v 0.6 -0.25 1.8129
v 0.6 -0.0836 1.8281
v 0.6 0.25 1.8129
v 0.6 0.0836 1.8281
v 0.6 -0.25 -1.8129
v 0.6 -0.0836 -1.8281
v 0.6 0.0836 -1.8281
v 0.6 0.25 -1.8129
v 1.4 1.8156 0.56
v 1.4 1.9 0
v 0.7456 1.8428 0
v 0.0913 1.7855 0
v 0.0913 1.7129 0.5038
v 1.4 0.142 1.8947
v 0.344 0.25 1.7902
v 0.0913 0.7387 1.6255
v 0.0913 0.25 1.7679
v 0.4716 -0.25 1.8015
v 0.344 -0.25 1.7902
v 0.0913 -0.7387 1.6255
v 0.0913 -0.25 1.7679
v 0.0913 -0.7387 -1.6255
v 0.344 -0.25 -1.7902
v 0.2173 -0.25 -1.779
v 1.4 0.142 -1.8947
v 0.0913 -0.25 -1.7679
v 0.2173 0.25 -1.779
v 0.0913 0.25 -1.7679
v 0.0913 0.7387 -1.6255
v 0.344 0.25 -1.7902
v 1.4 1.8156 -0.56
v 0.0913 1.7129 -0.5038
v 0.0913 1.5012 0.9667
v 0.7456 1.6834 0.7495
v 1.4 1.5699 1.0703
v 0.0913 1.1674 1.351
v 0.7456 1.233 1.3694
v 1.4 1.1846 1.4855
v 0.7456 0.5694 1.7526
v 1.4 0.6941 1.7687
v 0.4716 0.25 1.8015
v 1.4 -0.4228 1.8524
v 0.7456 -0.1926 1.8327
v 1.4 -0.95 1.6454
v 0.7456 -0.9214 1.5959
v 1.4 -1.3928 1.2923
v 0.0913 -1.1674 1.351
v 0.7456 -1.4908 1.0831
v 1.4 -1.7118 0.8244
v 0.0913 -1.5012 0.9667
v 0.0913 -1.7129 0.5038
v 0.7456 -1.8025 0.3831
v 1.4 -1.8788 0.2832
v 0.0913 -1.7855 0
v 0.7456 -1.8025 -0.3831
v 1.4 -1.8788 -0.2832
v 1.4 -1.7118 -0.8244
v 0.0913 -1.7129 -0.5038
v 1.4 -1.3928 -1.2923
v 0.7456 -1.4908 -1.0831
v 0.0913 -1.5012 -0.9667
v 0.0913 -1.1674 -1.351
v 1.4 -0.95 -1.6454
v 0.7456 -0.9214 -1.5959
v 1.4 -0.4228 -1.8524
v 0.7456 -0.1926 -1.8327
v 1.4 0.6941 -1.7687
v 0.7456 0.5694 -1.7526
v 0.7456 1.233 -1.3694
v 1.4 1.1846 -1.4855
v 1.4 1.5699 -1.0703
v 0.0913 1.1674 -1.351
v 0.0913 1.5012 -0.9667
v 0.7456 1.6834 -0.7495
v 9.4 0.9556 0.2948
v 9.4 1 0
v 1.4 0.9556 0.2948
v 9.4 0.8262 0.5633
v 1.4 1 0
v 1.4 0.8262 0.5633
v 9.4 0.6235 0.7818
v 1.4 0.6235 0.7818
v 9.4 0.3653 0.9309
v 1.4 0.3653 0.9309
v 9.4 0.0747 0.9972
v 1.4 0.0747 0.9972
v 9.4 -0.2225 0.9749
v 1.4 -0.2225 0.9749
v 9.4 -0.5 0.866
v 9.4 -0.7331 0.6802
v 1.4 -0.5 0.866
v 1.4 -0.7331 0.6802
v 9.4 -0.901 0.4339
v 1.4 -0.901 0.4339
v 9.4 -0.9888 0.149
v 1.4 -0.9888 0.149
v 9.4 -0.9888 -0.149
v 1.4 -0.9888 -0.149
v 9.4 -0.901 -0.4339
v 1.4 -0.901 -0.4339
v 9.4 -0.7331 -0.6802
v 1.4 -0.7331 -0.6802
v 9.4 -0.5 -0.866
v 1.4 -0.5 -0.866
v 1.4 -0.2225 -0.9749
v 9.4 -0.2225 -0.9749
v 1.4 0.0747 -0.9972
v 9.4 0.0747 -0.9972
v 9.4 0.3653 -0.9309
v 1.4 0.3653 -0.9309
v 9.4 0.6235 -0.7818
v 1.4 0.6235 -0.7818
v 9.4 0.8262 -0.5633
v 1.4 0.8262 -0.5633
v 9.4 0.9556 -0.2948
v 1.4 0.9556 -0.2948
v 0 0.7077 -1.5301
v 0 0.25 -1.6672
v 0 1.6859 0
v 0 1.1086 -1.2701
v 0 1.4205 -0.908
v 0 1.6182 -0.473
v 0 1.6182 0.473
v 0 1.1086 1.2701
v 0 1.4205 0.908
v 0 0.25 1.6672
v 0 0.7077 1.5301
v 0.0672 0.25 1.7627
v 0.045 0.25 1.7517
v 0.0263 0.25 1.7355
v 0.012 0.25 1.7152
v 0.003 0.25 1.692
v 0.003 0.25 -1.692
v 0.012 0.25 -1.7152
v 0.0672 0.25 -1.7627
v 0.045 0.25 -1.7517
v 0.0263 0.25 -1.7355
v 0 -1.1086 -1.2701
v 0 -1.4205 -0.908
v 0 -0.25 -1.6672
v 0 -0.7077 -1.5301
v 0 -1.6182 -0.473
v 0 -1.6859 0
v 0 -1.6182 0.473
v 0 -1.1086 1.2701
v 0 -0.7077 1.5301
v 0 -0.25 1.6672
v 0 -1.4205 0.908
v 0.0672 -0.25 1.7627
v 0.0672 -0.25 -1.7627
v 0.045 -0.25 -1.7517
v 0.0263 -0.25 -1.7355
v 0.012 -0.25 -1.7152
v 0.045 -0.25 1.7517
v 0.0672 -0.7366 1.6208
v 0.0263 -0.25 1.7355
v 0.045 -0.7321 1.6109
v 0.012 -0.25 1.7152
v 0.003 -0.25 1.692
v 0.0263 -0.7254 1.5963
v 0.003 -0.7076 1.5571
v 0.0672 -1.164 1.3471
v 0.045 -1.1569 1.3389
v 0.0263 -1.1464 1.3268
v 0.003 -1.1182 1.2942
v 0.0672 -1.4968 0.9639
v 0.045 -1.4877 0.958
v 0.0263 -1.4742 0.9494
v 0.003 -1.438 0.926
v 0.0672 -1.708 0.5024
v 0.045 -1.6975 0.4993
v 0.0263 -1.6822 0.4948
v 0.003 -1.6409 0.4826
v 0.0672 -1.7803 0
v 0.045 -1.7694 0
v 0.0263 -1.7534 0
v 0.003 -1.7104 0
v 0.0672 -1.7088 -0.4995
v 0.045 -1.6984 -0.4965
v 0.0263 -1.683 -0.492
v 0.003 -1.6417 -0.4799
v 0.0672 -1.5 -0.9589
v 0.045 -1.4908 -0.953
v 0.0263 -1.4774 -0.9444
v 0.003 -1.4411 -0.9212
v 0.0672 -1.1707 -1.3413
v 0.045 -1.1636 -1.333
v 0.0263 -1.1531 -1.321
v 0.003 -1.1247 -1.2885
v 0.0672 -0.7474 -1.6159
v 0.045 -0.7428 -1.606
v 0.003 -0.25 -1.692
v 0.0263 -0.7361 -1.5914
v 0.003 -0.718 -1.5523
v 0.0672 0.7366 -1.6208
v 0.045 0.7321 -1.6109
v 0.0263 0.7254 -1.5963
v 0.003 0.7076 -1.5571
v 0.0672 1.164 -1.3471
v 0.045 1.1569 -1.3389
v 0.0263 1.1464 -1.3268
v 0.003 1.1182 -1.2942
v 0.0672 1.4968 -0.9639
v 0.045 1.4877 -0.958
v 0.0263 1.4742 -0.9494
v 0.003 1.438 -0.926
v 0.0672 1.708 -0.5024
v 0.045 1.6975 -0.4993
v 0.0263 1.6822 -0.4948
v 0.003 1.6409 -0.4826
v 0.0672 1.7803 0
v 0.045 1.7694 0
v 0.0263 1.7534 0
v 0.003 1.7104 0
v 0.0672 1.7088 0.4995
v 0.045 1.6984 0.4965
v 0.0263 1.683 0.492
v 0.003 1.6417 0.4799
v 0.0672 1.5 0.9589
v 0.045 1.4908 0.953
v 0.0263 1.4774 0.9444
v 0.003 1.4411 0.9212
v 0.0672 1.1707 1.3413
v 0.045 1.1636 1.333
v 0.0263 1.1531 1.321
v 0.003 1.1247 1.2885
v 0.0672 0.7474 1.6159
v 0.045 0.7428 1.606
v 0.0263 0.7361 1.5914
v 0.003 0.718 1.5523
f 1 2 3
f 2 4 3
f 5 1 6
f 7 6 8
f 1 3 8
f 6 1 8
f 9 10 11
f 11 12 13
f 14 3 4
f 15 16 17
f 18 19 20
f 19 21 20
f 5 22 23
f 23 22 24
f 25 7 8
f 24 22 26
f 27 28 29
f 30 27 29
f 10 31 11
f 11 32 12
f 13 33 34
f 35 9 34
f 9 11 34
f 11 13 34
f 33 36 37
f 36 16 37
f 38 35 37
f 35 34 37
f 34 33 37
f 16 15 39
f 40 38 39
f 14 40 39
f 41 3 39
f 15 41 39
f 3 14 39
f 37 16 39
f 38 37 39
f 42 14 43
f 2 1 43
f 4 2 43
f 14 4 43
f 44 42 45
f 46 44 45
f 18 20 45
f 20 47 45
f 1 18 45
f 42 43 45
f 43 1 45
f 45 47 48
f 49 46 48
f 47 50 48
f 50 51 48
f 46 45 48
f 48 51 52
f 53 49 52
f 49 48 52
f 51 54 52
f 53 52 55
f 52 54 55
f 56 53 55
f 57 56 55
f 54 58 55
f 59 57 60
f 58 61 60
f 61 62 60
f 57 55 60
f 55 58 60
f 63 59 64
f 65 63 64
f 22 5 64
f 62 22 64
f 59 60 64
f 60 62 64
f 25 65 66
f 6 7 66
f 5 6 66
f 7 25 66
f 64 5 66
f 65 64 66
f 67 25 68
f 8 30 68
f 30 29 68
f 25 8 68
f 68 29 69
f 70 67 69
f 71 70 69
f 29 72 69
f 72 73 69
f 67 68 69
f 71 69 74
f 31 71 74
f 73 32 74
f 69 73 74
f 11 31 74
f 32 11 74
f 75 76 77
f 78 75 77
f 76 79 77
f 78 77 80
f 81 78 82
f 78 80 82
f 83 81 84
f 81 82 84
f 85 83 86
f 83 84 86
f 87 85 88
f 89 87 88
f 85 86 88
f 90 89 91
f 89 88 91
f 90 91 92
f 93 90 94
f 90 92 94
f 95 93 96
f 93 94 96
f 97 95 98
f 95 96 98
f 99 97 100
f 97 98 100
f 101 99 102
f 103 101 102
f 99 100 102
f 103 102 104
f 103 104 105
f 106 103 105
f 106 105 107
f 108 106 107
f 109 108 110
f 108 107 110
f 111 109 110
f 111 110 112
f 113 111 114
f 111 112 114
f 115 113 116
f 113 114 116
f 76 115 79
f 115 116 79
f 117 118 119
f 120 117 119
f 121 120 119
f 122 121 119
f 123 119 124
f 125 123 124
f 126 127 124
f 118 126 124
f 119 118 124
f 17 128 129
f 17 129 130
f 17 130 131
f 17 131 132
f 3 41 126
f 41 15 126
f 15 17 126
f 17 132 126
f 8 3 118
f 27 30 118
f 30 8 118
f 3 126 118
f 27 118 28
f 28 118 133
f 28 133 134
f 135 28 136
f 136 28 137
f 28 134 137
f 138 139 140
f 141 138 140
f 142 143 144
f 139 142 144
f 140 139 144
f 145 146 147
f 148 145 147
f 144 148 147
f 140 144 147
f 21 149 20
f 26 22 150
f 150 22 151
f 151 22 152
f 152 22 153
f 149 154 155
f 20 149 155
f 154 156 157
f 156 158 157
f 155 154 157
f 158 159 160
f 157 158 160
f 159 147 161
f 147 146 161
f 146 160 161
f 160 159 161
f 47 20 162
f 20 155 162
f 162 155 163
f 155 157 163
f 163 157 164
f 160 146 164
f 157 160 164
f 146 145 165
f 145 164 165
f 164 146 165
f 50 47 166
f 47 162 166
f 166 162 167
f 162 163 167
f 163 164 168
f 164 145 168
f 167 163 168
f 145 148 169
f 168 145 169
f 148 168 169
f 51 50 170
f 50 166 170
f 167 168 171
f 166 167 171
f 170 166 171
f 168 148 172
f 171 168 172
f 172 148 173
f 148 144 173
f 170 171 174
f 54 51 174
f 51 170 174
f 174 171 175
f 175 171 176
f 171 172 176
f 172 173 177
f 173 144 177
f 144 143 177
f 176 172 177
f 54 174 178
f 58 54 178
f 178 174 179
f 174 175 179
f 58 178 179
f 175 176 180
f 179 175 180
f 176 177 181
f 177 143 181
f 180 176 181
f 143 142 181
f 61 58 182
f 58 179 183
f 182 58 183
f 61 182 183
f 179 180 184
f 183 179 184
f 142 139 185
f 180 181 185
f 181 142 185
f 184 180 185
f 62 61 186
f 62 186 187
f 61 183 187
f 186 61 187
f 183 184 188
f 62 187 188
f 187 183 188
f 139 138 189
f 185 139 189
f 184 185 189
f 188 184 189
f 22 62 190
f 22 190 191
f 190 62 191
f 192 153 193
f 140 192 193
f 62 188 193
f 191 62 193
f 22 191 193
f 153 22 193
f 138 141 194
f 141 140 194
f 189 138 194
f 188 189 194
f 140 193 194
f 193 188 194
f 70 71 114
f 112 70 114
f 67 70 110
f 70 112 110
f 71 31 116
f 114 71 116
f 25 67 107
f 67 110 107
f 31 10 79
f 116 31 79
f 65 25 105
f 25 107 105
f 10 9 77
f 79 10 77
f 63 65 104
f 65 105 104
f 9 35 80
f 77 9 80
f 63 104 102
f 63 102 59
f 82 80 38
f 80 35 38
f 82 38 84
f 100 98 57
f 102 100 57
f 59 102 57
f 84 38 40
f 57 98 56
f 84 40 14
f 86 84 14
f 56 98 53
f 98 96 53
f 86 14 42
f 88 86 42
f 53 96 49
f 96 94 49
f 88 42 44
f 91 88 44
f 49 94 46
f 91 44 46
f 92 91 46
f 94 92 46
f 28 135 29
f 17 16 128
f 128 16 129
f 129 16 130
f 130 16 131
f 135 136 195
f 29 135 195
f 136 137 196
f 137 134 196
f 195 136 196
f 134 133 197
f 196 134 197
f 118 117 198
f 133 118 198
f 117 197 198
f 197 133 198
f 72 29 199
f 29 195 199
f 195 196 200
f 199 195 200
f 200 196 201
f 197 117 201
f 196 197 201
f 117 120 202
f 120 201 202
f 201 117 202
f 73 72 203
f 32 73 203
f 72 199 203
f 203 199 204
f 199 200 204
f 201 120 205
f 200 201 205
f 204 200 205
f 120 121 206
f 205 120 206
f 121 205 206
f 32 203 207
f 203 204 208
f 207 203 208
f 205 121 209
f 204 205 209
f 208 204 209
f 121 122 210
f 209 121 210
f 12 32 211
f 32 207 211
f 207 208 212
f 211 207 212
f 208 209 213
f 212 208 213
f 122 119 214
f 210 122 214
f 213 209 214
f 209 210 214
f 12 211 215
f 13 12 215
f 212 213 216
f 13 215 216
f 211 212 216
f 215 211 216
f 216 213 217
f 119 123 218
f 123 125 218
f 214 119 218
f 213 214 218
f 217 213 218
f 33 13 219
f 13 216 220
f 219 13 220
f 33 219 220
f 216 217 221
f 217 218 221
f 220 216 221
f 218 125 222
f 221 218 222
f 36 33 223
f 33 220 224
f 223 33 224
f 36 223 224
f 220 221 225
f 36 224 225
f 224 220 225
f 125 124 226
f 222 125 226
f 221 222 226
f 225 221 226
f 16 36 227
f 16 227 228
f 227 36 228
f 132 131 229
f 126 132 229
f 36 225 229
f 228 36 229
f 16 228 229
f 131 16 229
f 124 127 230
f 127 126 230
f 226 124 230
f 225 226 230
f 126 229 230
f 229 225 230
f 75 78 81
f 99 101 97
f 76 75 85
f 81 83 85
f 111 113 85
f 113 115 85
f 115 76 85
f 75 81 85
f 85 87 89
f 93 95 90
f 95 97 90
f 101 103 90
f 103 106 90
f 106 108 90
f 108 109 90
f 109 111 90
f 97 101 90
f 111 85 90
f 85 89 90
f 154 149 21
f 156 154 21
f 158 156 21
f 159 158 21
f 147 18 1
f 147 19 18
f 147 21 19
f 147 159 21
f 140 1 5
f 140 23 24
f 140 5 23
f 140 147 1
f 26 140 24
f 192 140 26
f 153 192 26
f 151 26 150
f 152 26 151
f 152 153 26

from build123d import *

# Parameters (mm, degrees)
FILLET2_R  = 0.1
SKETCH2_W  = 3.8
SKETCH2_H  = 0.5
SLOT_DEPTH = 0.6


with BuildPart() as part:
    # BodySke → Base-Revolve (revolve)
    with BuildSketch(Plane.XY):
        Polygon((1.4, 1), (1.4, 1.9), (0, 1.777515871), (0, 0), (9.4, 0), (9.4, 1), align=None)
    revolve(axis=Axis((-25.4, 0, 0), (1, 0, 0)))

    # Fillet2
    fillet2_edges = [part.edges().sort_by_distance(p)[0] for p in [
        (0, -1.777515871, 0),
    ]]
    fillet(fillet2_edges, radius=FILLET2_R)

    # Sketch2 → Slot (cut)
    with BuildSketch(Plane(origin=(0, 0, 0), x_dir=(0, 0, -1), z_dir=(1, 0, 0))):
        Rectangle(SKETCH2_W, SKETCH2_H)
    extrude(amount=SLOT_DEPTH, mode=Mode.SUBTRACT)


solid = part.part
